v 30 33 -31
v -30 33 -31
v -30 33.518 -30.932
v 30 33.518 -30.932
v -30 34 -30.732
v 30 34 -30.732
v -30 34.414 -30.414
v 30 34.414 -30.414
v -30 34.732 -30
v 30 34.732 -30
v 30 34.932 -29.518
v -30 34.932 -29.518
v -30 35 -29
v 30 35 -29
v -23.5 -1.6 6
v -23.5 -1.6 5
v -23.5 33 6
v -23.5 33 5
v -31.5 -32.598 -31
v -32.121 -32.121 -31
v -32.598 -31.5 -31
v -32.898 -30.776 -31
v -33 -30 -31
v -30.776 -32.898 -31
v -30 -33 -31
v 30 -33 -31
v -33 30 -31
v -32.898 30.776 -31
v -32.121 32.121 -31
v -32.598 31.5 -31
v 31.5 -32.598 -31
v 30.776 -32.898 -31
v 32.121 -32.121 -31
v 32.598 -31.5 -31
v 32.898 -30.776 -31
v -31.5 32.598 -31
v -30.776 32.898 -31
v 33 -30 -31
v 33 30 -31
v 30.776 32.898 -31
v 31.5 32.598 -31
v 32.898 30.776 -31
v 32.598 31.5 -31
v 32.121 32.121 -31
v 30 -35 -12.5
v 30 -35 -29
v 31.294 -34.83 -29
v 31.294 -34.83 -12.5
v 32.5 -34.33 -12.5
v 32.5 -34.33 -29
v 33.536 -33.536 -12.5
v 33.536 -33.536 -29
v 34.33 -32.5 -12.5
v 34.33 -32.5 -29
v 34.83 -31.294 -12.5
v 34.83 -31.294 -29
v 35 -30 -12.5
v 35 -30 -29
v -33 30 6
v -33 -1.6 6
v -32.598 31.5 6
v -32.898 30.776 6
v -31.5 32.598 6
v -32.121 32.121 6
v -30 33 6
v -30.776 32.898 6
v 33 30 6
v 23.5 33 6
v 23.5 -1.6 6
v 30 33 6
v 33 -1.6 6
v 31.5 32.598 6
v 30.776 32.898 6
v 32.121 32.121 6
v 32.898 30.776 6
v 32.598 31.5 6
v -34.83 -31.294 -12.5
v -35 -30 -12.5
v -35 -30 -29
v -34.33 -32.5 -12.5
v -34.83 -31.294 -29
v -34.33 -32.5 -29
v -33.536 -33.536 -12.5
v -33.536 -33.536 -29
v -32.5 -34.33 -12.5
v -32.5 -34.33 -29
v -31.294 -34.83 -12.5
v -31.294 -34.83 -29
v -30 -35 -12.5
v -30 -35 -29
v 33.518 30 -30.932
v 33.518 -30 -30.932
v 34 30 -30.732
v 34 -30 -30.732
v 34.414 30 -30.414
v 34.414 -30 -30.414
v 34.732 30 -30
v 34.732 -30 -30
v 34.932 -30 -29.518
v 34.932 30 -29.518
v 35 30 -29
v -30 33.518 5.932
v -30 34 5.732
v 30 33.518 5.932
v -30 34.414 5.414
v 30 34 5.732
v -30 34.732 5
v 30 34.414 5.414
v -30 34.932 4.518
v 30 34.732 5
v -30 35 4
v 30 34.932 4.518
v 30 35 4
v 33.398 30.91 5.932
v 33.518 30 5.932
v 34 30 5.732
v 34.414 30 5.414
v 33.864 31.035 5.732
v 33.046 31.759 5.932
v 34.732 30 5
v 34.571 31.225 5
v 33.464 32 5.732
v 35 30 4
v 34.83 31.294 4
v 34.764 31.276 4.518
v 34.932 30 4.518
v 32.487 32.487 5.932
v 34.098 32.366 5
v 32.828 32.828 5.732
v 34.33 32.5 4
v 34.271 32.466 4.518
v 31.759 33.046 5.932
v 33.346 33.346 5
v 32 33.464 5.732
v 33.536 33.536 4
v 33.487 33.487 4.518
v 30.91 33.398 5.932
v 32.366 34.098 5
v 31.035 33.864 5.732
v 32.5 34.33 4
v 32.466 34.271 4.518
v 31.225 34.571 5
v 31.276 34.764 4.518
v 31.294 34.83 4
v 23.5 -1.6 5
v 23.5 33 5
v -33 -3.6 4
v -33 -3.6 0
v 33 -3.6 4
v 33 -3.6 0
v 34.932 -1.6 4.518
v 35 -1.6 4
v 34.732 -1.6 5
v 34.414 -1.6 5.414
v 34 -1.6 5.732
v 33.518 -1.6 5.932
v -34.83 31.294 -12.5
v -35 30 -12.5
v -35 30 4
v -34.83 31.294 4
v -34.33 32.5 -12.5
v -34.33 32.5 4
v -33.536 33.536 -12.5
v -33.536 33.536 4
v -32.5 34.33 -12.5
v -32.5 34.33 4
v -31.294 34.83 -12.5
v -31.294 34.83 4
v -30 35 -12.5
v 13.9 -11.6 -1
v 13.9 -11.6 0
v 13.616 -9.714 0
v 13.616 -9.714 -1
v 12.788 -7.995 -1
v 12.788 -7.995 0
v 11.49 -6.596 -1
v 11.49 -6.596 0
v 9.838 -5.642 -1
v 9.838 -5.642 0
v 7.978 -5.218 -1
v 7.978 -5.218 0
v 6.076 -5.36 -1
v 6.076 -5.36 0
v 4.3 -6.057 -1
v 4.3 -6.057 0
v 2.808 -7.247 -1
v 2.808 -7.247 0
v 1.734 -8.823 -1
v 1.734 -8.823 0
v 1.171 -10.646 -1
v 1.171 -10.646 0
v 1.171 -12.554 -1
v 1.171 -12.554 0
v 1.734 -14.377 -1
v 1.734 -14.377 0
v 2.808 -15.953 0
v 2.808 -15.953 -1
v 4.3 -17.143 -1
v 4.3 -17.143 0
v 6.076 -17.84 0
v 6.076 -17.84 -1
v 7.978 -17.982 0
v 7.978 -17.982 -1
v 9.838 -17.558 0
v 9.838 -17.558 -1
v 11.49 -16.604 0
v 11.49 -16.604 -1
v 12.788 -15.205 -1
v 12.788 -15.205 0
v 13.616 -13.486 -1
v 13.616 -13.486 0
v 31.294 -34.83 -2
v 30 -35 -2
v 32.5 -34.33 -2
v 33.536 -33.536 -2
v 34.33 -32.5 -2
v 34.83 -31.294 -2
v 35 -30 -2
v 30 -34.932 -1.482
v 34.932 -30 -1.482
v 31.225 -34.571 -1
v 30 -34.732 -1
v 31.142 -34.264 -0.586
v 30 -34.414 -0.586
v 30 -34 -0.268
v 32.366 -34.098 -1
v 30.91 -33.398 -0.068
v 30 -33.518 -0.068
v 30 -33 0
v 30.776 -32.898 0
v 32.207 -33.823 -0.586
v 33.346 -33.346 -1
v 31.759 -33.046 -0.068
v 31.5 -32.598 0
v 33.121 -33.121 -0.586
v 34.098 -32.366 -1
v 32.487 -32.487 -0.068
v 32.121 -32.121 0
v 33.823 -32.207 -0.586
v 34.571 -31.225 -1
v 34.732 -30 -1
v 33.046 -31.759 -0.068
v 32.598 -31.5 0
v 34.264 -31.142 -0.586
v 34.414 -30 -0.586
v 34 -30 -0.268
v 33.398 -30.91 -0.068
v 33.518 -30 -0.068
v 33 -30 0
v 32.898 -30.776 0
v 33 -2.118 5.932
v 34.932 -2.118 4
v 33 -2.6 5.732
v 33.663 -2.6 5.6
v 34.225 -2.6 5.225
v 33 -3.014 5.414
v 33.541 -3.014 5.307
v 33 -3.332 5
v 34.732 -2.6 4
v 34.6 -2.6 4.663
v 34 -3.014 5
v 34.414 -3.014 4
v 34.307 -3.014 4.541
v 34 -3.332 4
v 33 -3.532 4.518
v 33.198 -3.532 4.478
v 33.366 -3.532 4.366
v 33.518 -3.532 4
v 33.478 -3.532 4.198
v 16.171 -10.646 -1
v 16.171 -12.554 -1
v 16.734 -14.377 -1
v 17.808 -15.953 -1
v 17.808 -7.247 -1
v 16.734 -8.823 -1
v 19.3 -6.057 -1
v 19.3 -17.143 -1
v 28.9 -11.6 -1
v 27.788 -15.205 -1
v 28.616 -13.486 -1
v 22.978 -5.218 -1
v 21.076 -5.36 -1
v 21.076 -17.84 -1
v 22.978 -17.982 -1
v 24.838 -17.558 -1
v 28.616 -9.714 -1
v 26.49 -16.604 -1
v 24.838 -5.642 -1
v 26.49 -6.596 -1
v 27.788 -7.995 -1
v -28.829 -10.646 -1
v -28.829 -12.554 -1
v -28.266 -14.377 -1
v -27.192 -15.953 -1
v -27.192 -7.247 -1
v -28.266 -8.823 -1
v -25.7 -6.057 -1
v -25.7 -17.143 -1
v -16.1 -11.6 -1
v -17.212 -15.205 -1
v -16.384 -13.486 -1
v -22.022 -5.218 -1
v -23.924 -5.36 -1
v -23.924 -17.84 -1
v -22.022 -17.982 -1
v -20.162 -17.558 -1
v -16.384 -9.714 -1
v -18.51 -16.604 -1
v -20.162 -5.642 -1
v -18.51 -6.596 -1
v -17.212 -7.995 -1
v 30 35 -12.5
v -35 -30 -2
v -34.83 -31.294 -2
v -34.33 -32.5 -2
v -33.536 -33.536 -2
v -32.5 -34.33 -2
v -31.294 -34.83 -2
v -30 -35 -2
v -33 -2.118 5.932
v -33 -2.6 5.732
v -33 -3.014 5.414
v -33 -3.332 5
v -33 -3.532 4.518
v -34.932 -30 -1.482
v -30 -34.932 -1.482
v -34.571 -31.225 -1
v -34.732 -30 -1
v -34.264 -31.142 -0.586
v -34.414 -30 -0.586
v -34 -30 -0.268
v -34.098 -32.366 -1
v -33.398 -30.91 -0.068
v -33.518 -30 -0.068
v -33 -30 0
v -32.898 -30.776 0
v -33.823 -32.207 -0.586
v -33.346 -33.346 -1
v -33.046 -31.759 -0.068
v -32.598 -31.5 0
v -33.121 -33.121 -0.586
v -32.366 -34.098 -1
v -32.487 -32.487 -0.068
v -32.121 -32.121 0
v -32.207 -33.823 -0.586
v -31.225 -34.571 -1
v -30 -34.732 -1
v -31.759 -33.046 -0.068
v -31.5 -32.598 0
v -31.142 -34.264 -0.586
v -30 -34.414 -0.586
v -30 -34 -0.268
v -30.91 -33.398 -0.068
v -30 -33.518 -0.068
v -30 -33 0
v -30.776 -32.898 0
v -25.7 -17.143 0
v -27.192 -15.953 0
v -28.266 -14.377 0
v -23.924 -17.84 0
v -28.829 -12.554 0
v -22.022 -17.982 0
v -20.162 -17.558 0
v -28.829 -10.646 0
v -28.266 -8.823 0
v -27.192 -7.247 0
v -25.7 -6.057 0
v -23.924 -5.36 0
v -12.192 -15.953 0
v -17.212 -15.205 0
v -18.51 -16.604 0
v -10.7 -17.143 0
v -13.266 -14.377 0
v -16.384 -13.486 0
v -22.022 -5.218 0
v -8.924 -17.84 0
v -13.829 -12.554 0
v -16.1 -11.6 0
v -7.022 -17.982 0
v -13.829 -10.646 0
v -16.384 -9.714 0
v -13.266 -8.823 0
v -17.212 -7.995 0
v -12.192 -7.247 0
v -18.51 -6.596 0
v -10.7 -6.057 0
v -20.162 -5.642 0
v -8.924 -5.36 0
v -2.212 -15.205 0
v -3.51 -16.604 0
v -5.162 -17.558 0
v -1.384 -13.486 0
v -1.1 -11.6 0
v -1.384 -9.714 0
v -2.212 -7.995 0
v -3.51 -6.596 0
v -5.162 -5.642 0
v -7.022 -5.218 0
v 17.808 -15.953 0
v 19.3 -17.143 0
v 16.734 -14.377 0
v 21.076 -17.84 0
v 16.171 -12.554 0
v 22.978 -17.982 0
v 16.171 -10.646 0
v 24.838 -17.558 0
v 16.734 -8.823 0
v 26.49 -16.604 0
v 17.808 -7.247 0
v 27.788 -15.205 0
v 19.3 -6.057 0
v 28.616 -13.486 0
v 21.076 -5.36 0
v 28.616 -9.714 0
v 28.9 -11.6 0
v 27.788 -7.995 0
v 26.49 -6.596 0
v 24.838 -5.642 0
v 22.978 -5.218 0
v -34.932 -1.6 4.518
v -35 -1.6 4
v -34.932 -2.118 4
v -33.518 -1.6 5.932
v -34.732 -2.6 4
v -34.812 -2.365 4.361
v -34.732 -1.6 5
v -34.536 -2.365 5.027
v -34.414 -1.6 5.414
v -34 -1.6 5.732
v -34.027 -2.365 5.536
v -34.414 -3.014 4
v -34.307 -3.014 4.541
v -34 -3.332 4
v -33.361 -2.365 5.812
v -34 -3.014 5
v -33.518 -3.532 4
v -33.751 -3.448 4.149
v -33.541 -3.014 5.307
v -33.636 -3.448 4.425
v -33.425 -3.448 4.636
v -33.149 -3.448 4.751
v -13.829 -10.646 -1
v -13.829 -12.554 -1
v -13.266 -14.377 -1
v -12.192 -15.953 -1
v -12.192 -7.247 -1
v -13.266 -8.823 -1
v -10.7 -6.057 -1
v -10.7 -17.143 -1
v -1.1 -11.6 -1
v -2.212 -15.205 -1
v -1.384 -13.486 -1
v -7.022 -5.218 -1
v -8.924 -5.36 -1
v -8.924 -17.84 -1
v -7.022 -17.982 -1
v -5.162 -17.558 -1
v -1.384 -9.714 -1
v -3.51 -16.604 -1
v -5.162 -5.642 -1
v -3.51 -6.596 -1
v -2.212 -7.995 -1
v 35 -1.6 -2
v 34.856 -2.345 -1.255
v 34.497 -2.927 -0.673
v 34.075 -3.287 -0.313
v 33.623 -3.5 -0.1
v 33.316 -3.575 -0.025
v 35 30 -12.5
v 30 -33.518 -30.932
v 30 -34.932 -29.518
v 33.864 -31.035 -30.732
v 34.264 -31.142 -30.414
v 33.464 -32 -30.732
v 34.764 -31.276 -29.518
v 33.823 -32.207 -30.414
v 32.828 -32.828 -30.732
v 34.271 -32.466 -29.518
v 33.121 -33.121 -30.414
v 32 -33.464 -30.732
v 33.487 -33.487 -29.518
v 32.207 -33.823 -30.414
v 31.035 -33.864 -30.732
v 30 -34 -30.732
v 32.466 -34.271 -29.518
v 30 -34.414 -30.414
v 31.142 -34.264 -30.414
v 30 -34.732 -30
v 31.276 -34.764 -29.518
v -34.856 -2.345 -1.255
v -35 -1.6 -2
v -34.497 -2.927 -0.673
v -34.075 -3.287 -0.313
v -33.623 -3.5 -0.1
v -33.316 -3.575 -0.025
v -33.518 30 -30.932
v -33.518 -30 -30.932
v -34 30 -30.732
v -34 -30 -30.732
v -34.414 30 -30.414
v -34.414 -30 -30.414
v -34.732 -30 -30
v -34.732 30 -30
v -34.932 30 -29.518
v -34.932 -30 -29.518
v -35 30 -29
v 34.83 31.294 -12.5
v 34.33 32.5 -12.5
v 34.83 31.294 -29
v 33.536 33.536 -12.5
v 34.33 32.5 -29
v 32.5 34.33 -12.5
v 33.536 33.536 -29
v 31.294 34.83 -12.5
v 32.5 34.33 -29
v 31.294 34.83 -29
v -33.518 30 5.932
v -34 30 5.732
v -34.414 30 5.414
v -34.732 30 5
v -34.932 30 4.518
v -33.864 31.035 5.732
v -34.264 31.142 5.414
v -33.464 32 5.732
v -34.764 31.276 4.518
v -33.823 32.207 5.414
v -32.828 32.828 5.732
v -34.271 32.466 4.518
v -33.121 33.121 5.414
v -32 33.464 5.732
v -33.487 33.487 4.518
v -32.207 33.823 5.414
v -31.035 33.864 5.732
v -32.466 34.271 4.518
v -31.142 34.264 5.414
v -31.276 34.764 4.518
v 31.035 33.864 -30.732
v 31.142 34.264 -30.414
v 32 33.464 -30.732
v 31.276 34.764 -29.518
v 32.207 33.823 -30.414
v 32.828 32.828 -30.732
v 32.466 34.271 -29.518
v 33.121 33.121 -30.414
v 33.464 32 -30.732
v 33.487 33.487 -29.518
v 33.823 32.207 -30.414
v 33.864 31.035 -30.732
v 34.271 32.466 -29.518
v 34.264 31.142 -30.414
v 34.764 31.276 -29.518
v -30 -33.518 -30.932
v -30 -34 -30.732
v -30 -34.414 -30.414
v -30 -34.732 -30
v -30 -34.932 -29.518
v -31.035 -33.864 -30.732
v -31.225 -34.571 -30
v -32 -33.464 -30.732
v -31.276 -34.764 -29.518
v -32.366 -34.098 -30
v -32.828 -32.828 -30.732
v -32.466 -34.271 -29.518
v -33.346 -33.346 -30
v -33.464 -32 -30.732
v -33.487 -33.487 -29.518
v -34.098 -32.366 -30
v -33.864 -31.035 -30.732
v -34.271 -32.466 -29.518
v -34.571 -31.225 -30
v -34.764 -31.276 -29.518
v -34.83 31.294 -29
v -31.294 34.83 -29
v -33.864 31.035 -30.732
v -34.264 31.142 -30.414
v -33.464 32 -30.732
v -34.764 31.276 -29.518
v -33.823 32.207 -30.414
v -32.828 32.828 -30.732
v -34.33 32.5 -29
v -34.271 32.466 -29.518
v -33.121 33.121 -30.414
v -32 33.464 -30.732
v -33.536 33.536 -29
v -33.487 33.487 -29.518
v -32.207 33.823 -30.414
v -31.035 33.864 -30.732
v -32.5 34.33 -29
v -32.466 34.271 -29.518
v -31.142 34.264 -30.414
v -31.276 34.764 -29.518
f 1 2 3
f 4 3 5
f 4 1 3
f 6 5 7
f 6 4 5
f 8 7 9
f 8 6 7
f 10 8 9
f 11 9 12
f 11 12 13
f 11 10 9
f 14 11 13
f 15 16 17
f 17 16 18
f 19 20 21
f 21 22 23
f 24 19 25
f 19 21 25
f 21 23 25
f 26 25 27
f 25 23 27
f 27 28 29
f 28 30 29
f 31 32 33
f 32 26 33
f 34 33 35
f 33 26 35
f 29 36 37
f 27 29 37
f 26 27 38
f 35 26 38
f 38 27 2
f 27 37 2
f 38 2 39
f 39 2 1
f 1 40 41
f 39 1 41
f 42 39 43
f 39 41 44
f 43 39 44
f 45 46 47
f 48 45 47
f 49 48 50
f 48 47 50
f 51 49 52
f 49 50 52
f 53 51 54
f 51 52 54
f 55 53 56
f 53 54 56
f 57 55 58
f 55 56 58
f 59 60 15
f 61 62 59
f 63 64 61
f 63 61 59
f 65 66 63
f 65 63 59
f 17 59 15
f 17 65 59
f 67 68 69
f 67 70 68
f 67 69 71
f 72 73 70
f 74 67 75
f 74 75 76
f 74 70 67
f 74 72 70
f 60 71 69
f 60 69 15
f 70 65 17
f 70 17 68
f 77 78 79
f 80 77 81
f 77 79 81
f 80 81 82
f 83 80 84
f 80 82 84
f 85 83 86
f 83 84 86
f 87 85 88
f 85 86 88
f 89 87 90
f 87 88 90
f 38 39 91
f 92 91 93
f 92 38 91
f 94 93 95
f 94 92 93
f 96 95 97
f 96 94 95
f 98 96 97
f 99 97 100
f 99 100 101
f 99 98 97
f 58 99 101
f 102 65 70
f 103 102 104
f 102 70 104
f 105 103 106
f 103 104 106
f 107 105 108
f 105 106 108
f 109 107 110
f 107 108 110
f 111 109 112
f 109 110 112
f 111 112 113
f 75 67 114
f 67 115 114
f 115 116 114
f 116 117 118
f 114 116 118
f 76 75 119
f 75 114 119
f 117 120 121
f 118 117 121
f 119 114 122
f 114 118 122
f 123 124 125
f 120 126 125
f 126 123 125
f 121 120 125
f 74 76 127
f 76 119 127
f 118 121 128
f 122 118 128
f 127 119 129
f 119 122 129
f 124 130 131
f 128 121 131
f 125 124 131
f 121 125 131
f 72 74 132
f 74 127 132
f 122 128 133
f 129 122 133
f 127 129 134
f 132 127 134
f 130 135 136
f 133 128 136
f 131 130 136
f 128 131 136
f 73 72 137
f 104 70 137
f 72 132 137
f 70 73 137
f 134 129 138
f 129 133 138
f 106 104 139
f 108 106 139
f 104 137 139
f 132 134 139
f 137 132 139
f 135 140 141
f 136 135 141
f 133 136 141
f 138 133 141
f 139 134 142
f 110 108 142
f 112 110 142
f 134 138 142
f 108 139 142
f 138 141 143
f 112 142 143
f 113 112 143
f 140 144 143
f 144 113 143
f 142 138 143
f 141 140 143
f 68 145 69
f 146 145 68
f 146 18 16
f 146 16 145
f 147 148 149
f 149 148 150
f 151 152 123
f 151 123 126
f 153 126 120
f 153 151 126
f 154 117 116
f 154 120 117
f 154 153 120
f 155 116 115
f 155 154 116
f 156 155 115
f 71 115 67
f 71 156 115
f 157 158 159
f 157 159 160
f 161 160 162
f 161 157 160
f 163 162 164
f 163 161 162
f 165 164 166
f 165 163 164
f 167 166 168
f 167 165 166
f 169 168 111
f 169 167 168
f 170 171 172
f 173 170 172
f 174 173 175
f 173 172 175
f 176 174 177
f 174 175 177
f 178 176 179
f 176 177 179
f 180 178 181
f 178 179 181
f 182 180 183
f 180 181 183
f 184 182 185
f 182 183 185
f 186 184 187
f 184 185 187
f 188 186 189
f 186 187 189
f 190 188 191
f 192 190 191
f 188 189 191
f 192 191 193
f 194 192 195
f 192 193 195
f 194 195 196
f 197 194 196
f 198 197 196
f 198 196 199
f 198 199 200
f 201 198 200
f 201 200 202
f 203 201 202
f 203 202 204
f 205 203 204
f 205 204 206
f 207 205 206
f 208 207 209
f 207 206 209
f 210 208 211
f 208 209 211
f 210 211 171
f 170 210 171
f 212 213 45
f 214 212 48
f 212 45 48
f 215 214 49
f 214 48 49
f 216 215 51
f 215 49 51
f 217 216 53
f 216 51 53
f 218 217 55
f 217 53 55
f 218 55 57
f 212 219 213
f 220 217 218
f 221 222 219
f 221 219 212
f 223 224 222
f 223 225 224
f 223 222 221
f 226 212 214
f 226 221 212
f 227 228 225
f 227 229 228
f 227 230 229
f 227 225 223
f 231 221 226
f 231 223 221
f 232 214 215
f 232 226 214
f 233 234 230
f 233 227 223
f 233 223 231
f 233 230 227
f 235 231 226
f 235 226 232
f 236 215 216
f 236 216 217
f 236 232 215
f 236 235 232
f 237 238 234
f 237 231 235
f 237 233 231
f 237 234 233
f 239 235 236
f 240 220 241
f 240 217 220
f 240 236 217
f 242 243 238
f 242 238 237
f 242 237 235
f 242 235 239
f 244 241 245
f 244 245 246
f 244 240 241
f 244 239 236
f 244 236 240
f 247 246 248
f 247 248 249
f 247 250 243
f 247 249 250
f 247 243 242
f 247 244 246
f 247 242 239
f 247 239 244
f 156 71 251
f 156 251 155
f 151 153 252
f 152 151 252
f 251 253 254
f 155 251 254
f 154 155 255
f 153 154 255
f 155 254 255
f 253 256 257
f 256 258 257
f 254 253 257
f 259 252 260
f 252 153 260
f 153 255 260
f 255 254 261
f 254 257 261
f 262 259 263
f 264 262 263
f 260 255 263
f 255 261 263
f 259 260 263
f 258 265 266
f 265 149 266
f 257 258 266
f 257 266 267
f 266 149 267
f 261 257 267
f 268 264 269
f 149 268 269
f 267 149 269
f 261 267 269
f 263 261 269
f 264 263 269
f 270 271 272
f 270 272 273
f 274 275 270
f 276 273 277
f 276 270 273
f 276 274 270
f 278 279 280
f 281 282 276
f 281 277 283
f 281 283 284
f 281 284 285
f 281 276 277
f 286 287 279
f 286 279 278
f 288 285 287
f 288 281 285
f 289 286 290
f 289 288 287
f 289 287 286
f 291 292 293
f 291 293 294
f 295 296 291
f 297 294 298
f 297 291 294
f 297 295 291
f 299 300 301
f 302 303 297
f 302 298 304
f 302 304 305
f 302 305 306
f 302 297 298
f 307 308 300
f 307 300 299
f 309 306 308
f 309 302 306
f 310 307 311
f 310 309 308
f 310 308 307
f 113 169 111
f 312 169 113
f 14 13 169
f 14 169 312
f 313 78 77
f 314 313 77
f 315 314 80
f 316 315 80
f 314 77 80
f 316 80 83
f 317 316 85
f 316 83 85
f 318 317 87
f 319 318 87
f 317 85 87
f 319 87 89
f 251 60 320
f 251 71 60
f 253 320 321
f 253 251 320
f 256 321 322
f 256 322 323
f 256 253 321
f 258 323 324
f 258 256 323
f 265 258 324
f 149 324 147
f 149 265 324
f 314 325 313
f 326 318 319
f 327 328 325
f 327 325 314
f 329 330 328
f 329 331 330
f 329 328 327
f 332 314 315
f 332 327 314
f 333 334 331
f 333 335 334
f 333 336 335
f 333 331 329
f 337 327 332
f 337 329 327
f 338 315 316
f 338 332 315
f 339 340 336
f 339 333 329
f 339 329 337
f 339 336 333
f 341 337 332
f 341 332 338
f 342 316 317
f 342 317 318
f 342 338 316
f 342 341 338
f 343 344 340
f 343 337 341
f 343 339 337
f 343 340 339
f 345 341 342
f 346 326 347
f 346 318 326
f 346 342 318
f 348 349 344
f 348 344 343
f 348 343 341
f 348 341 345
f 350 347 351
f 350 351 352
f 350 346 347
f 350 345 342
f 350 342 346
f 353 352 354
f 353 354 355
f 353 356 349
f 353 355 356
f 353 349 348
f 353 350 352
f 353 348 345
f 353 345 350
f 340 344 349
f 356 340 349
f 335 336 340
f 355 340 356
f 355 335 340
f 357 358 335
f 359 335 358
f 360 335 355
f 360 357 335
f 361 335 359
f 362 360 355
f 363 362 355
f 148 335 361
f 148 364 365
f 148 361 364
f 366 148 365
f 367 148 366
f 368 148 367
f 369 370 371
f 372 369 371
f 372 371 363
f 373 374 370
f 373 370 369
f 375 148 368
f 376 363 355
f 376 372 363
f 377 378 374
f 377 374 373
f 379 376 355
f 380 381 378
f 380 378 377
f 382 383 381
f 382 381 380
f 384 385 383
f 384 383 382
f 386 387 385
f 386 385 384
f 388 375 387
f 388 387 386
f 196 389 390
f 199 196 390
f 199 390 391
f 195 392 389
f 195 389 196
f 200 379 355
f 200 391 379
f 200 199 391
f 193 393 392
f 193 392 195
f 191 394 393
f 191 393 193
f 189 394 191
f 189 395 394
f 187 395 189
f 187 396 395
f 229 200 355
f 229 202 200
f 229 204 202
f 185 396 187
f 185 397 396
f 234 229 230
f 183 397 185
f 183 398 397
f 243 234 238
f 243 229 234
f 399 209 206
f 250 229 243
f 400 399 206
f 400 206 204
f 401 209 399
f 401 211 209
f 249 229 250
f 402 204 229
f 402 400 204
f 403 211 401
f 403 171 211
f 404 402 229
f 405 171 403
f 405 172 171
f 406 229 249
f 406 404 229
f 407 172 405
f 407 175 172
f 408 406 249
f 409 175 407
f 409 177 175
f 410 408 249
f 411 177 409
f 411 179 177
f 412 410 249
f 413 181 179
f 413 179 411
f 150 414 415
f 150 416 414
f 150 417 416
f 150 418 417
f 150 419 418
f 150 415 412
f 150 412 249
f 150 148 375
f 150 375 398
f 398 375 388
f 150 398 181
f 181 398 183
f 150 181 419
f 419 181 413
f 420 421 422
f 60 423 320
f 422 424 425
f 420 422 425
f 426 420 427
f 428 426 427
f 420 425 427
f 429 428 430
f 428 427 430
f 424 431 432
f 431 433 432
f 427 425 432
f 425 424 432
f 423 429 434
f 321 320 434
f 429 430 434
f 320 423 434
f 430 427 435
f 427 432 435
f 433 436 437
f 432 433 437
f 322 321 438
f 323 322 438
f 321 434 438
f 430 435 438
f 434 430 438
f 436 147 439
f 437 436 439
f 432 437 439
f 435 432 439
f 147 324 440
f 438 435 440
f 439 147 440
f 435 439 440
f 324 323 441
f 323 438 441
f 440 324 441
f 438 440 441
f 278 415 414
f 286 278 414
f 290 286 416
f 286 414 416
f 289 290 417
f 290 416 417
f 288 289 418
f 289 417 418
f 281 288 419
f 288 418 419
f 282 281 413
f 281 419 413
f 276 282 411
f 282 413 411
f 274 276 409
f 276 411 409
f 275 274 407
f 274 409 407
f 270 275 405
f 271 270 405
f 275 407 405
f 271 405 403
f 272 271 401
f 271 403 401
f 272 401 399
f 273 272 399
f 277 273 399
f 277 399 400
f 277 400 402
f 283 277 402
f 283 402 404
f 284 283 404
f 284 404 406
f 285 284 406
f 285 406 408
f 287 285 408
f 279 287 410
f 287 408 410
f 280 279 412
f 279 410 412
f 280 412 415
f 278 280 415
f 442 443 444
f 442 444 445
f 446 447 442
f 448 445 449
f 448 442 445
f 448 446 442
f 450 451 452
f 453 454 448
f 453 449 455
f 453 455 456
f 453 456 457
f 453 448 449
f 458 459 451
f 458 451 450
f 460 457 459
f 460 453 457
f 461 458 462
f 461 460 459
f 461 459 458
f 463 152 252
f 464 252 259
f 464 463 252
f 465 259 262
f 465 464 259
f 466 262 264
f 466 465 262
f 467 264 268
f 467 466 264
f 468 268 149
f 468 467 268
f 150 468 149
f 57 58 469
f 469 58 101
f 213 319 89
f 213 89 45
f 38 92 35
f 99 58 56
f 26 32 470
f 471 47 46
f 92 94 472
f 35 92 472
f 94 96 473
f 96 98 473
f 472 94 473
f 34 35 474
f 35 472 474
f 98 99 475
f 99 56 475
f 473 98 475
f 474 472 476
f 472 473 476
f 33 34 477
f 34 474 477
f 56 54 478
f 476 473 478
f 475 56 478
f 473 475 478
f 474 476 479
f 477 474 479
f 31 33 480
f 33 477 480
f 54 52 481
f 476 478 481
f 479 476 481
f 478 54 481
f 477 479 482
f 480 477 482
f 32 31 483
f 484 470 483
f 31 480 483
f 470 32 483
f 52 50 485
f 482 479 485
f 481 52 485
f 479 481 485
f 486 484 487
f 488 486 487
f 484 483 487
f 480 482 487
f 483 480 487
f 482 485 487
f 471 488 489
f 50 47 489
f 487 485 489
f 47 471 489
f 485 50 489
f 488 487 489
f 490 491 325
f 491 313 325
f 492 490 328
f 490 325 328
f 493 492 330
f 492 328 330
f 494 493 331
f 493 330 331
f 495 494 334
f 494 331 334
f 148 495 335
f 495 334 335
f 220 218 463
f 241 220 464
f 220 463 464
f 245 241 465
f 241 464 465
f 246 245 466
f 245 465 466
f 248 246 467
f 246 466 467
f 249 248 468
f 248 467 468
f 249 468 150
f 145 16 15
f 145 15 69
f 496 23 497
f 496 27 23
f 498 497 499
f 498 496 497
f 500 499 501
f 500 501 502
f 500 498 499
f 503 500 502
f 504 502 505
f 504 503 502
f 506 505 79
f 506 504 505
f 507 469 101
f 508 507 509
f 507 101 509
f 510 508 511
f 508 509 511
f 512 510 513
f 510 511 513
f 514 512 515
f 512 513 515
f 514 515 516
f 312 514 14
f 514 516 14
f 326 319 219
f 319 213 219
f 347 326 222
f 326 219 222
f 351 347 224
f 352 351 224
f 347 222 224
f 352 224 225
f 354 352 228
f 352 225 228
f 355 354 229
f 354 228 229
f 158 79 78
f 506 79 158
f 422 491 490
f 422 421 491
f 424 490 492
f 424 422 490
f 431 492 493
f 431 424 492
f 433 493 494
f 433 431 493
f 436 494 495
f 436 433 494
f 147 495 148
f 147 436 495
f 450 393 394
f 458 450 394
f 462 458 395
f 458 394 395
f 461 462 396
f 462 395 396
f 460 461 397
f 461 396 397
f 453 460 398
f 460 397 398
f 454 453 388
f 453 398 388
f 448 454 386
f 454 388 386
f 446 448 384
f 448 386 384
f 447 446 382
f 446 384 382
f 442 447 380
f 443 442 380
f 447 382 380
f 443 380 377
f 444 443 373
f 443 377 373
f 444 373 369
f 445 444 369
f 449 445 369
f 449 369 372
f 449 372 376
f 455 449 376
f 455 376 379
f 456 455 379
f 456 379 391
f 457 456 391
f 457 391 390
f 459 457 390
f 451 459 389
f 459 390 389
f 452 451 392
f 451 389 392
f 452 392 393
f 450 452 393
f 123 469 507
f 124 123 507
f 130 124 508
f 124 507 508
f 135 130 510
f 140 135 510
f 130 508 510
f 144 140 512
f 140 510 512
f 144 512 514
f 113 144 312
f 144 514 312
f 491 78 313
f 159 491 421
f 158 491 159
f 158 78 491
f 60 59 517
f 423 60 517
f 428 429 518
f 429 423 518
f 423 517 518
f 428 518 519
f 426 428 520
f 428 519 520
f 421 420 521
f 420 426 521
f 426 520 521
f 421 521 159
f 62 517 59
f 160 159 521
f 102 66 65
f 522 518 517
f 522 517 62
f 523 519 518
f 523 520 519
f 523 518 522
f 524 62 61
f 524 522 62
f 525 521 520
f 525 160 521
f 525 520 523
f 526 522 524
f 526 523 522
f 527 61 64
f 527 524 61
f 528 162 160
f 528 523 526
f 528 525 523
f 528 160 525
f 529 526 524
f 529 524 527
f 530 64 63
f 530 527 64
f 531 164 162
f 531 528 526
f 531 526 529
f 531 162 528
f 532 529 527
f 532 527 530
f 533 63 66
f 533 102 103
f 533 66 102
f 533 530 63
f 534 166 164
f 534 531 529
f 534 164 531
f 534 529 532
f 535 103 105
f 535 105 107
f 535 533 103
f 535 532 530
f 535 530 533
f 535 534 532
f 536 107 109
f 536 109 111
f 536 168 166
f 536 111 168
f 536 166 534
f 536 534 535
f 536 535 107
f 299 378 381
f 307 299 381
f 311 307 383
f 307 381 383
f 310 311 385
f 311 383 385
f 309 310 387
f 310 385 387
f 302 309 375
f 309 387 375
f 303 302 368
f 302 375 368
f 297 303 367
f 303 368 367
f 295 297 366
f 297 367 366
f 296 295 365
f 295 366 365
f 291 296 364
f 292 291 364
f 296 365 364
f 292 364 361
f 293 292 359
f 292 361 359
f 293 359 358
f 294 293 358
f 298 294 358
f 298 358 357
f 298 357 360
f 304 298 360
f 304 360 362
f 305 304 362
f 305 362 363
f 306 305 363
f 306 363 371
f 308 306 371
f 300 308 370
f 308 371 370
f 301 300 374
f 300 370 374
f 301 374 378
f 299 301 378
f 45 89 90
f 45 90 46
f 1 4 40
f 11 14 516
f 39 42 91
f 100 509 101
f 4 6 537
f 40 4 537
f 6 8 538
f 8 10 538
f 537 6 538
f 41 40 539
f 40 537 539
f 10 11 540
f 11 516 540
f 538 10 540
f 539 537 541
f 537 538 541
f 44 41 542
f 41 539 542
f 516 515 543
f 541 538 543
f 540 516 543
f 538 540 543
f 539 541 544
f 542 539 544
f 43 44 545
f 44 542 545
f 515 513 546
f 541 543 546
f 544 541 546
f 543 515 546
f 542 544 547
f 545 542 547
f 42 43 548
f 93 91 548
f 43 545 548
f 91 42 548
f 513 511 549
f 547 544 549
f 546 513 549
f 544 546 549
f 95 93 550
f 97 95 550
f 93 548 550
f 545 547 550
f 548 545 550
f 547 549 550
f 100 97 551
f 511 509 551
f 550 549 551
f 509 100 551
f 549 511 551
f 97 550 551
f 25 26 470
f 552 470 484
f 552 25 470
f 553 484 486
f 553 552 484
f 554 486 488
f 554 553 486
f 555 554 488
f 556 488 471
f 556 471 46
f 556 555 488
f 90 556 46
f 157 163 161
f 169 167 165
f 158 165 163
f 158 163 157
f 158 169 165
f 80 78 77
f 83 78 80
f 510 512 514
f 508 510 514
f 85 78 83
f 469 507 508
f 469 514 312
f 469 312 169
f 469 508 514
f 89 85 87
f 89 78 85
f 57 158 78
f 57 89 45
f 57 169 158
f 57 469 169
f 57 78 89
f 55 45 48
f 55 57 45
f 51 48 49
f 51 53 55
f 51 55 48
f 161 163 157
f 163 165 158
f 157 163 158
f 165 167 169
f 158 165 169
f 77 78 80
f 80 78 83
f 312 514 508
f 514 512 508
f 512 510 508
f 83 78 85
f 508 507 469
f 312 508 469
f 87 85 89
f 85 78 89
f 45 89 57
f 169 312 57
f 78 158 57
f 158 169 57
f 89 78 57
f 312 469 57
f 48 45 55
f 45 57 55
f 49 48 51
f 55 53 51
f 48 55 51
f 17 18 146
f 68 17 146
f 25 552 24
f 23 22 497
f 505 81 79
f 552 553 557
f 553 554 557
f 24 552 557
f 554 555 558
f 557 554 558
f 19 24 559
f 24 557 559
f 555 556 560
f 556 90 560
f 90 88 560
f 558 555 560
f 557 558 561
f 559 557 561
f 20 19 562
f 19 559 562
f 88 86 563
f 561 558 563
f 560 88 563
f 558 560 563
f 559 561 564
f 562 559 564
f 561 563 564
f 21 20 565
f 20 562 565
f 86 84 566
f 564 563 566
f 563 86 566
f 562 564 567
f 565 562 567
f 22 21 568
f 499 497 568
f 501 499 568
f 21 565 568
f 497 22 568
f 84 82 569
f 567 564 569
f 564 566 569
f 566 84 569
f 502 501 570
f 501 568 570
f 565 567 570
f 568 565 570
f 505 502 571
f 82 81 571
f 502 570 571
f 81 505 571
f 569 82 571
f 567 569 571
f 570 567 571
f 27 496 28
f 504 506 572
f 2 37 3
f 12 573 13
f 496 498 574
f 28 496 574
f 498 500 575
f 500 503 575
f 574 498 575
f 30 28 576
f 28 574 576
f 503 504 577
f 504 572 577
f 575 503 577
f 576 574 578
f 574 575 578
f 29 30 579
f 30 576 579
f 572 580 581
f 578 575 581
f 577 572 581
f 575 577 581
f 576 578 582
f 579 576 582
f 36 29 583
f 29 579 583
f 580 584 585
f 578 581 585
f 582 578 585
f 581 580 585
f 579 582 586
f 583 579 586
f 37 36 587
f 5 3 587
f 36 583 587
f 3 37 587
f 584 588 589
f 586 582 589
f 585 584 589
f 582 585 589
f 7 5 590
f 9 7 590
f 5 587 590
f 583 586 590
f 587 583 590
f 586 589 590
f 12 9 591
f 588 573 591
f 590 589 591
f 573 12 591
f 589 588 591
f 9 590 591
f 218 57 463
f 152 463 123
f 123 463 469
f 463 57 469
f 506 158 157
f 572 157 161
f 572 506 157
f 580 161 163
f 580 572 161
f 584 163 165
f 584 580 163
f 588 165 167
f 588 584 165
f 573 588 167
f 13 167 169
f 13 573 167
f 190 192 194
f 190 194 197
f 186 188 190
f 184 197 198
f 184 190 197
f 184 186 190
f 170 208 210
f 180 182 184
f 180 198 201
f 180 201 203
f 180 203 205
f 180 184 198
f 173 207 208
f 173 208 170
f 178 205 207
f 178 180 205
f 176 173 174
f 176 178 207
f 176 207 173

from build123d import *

# Parameters (mm, degrees)
SKETCH_1_W                     = 70
SKETCH_1_H                     = 70
EXTRUDE_2_DEPTH                = 31
SKETCH_4_W                     = 70
SKETCH_4_H                     = 38.6
EXTRUDE_3_DEPTH                = 6
SKETCH_3_R                     = 6.4
CUT_EXTRUDE_2_DEPTH            = 1
SPLIT_BODIES_1_SURFACE_1_BACK  = 106.683
SPLIT_BODIES_1_SURFACE_1_DEPTH = 213.366
SPLIT_BODIES_1_SURFACE_2_BACK  = 106.683
SPLIT_BODIES_1_SURFACE_2_DEPTH = 213.366
WRAP_START                     = 5
WRAP_1_OUTLINE_W               = 47
WRAP_1_OUTLINE_H               = 34.6
WRAP_1_DEPTH                   = 1
FILLET_1_R                     = 5
FILLET_2_R                     = 2
FILLET_3_R                     = 5
FILLET_4_R                     = 5
FILLET_5_R                     = 5
FILLET_START                   = -30
FILLET_6_DEPTH                 = 65
FILLET_6_2_ANGLE               = 90
FILLET_7_R                     = 2
FILLET_8_R                     = 2
FILLET_9_R                     = 5
FILLET_10_R                    = 5
FILLET_11_R                    = 5
FILLET_12_R                    = 5
FILLET_13_R                    = 2


with BuildPart() as part:
    # 草图1 → 凸台-拉伸2 (new body)
    with BuildSketch(Plane.XY):
        Rectangle(SKETCH_1_W, SKETCH_1_H)
    extrude(amount=-EXTRUDE_2_DEPTH)

    # 草图4 → 凸台-拉伸3 (add)
    with BuildSketch(Plane.XY):
        with Locations((0, 15.7)):
            Rectangle(SKETCH_4_W, SKETCH_4_H)
    extrude(amount=EXTRUDE_3_DEPTH)

    # 草图3 → 切除-拉伸2 (cut)
    with BuildSketch(Plane.XY):
        with Locations((-22.5, -11.6)):
            Circle(SKETCH_3_R)
        with Locations((-7.5, -11.6)):
            Circle(SKETCH_3_R)
        with Locations((7.5, -11.6)):
            Circle(SKETCH_3_R)
        with Locations((22.5, -11.6)):
            Circle(SKETCH_3_R)
    extrude(amount=-CUT_EXTRUDE_2_DEPTH, mode=Mode.SUBTRACT)


with BuildPart() as body_2:
    # Split Bodies 1: the piece behind the surface
    add(part.part)
    # Split Bodies 1 surface: a surface, the sketch's curves swept straight by 213.366 mm
    with BuildLine(Plane.ZY.offset(35).offset(-SPLIT_BODIES_1_SURFACE_1_BACK), mode=Mode.PRIVATE) as split_bodies_1_surface_1_path:
        Line((-12.5, 35), (-12.5, -35))
    split_bodies_1_surface_1 = Shell.extrude(split_bodies_1_surface_1_path.wire(), (-1 * SPLIT_BODIES_1_SURFACE_1_DEPTH, 0 * SPLIT_BODIES_1_SURFACE_1_DEPTH, 0 * SPLIT_BODIES_1_SURFACE_1_DEPTH))
    split(bisect_by=split_bodies_1_surface_1, keep=Keep.BOTTOM)

    # 圆角9
    fillet_9_edges = [body_2.edges().sort_by_distance(p)[0] for p in [
        (-35, 35, -21.75),
    ]]
    fillet(fillet_9_edges, radius=FILLET_9_R)

    # 圆角10
    fillet_10_edges = [body_2.edges().sort_by_distance(p)[0] for p in [
        (-35, -35, -21.75),
    ]]
    fillet(fillet_10_edges, radius=FILLET_10_R)

    # 圆角11
    fillet_11_edges = [body_2.edges().sort_by_distance(p)[0] for p in [
        (35, -35, -21.75),
    ]]
    fillet(fillet_11_edges, radius=FILLET_11_R)

    # 圆角12
    fillet_12_edges = [body_2.edges().sort_by_distance(p)[0] for p in [
        (35, 35, -21.75),
    ]]
    fillet(fillet_12_edges, radius=FILLET_12_R)

    # 圆角13
    fillet_13_edges = [body_2.edges().sort_by_distance(p)[0] for p in [
        (-35, 0, -31),
        (-33.535533906, 33.535533906, -31),
        (0, -35, -31),
        (-33.535533906, -33.535533906, -31),
        (35, 0, -31),
        (33.535533906, -33.535533906, -31),
        (0, 35, -31),
        (33.535533906, 33.535533906, -31),
    ]]
    fillet(fillet_13_edges, radius=FILLET_13_R)


with BuildPart() as part_1:
    add(part.part)

    # Split Bodies 1: split by a surface, the side it looks to stays
    # Split Bodies 1 surface: a surface, the sketch's curves swept straight by 213.366 mm
    with BuildLine(Plane.ZY.offset(35).offset(-SPLIT_BODIES_1_SURFACE_2_BACK), mode=Mode.PRIVATE) as split_bodies_1_surface_2_path:
        Line((-12.5, 35), (-12.5, -35))
    split_bodies_1_surface_2 = Shell.extrude(split_bodies_1_surface_2_path.wire(), (-1 * SPLIT_BODIES_1_SURFACE_2_DEPTH, 0 * SPLIT_BODIES_1_SURFACE_2_DEPTH, 0 * SPLIT_BODIES_1_SURFACE_2_DEPTH))
    split(bisect_by=split_bodies_1_surface_2, keep=Keep.TOP)

    # 包覆1: read off the stored shape, not the designer's step
    # 包覆1 outline → 包覆1 (cut)
    with BuildSketch(Plane.XY.offset(WRAP_START)):
        with Locations((0, 15.7)):
            Rectangle(WRAP_1_OUTLINE_W, WRAP_1_OUTLINE_H)
    extrude(amount=WRAP_1_DEPTH, mode=Mode.SUBTRACT)

    # 圆角1
    fillet_1_edges = [part_1.edges().sort_by_distance(p)[0] for p in [
        (-35, 35, -3.25),
    ]]
    fillet(fillet_1_edges, radius=FILLET_1_R)

    # 圆角2
    fillet_2_edges = [part_1.edges().sort_by_distance(p)[0] for p in [
        (2.5, 35, 6),
        (-35, 13.2, 6),
        (-33.535533906, 33.535533906, 6),
    ]]
    fillet(fillet_2_edges, radius=FILLET_2_R - 0.0001)  # a hair under: the kernel refuses the full size

    # 圆角3
    # the kernel refuses this fillet: 5 mm, written as the material it takes off along each edge
    with BuildSketch(Plane(origin=(35, 35, -25), x_dir=(-1, 0, 0), z_dir=(0, 0, 1))) as fillet_3_piece_1:
        with BuildLine():
            CenterArc((FILLET_3_R, FILLET_3_R), FILLET_3_R, 180, 90)
            Line((0, FILLET_3_R), (0, 0))
            Line((0, 0), (FILLET_3_R, 0))
        make_face()
    extrude(amount=41.5001, mode=Mode.SUBTRACT)

    # 圆角4
    fillet_4_edges = [part_1.edges().sort_by_distance(p)[0] for p in [
        (-35, -35, -6.25),
    ]]
    fillet(fillet_4_edges, radius=FILLET_4_R)

    # 圆角5
    fillet_5_edges = [part_1.edges().sort_by_distance(p)[0] for p in [
        (35, -35, -6.25),
    ]]
    fillet(fillet_5_edges, radius=FILLET_5_R)

    # 圆角6: read off the stored shape, not the designer's step
    # 圆角6 outline → 圆角6 (cut)
    with BuildSketch(Plane(origin=(0, 0, 0), x_dir=(1, 0, 0), z_dir=(0, 1, 0)).offset(FILLET_START)):
        with BuildLine():
            Line((35, -6), (35, -4))
            ThreePointArc((35, -4), (34.414213562, -5.414213562), (33, -6))
            Line((33, -6), (35, -6))
        make_face()
    extrude(amount=FILLET_6_DEPTH, mode=Mode.SUBTRACT)

    # Fillet 6 2 outline → Fillet 6 2 (revolve, cut)
    with BuildSketch(Plane(origin=(30, 30, 0), x_dir=(1, 0, 0), z_dir=(0, -1, 0))):
        with BuildLine():
            ThreePointArc((3, 6), (4.414213562, 5.414213562), (5, 4))
            Line((5, 4), (5, 6))
            Line((5, 6), (3, 6))
        make_face()
    revolve(axis=Axis((30, 30, 0), (0, 0, 1)), revolution_arc=FILLET_6_2_ANGLE, mode=Mode.SUBTRACT)

    # 圆角7
    fillet_7_edges = [part_1.edges().sort_by_distance(p)[0] for p in [
        (-35, -3.6, 2.00005),
        (-5e-05, -3.6, 6),
        (-34.414242852, -3.6, 5.414242852),
        (35, -3.6, 2),
        (34.414213562, -3.6, 5.414213562),
    ]]
    fillet(fillet_7_edges, radius=FILLET_7_R - 0.0001)  # a hair under: the kernel refuses the full size

    # 圆角8
    fillet_8_edges = [part_1.edges().sort_by_distance(p)[0] for p in [
        (-35, -15.80005, 0),
        (0, -35, 0),
        (-33.535533906, -33.535533906, 0),
        (35, -15.80005, 0),
        (33.535533906, -33.535533906, 0),
    ]]
    fillet(fillet_8_edges, radius=FILLET_8_R - 0.0001)  # a hair under: the kernel refuses the full size


solid = Compound([body_2.part, part_1.part])
